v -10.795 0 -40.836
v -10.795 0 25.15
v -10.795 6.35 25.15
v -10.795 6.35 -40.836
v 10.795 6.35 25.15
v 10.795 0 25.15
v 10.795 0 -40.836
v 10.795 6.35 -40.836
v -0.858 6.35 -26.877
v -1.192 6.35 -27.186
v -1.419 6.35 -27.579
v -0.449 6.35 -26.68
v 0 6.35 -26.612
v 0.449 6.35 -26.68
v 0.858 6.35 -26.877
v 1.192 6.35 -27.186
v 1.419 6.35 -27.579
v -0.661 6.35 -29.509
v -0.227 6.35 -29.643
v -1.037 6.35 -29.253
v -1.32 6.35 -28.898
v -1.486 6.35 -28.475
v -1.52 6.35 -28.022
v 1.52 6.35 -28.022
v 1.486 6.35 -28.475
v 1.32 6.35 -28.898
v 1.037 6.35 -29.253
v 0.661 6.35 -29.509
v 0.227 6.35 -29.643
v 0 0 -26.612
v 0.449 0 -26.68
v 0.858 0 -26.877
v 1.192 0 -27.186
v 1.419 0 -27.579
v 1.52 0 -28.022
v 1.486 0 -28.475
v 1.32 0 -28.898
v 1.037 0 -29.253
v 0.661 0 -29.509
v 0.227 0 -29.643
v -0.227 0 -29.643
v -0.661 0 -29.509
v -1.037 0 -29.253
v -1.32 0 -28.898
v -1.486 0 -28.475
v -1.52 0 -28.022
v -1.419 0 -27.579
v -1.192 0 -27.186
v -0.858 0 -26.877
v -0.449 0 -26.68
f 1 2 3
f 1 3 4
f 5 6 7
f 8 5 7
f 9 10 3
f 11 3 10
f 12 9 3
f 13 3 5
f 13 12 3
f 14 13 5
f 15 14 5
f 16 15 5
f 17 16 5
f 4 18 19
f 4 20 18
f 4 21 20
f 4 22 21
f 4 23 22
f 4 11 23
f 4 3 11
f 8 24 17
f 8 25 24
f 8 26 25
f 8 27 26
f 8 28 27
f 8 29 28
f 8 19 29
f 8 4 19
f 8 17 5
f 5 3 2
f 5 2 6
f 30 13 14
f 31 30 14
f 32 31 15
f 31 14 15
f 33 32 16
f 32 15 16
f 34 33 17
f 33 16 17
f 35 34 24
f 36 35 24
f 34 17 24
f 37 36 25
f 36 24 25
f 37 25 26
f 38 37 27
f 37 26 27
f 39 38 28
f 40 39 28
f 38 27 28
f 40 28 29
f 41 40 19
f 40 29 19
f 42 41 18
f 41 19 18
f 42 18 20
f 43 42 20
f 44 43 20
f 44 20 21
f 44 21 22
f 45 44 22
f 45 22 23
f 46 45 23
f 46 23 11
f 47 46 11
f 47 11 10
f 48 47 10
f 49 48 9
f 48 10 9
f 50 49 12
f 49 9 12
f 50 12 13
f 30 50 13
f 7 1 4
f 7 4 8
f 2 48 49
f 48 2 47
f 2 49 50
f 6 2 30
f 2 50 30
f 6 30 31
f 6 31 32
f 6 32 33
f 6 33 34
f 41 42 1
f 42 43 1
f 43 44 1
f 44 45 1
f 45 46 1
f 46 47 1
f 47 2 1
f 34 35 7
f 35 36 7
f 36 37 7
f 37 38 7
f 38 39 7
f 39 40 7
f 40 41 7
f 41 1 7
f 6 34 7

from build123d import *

# Parameters (mm, degrees)
SKETCH1_W           = 21.59
SKETCH1_H           = 81.67214734
BOSS_EXTRUDE1_DEPTH = 6.35
SKETCH2_W           = 21.59
SKETCH2_H           = 15.68610503
CUT_EXTRUDE1_DEPTH  = 6.35
SKETCH3_R           = 1.524
CUT_EXTRUDE2_DEPTH  = 6.35


with BuildPart() as part:
    # Sketch1 → Boss-Extrude1 (new body)
    with BuildSketch(Plane(origin=(0, 0, 0), x_dir=(1, 0, 0), z_dir=(0, 1, 0))):
        Rectangle(SKETCH1_W, SKETCH1_H)
    extrude(amount=BOSS_EXTRUDE1_DEPTH)

    # Sketch2 → Cut-Extrude1 (cut)
    with BuildSketch(Plane(origin=(0, 6.35, 0), x_dir=(1, 0, 0), z_dir=(0, 1, 0))):
        with Locations((0, -32.993021155)):
            Rectangle(SKETCH2_W, SKETCH2_H)
    extrude(amount=-CUT_EXTRUDE1_DEPTH, mode=Mode.SUBTRACT)

    # Sketch3 → Cut-Extrude2 (cut)
    with BuildSketch(Plane(origin=(0, 6.35, 0), x_dir=(1, 0, 0), z_dir=(0, 1, 0))):
        with Locations(Location((0, 28.13607367, 0), (0, 0, 270))):
            Circle(SKETCH3_R)
    extrude(amount=-CUT_EXTRUDE2_DEPTH, mode=Mode.SUBTRACT)


solid = part.part
